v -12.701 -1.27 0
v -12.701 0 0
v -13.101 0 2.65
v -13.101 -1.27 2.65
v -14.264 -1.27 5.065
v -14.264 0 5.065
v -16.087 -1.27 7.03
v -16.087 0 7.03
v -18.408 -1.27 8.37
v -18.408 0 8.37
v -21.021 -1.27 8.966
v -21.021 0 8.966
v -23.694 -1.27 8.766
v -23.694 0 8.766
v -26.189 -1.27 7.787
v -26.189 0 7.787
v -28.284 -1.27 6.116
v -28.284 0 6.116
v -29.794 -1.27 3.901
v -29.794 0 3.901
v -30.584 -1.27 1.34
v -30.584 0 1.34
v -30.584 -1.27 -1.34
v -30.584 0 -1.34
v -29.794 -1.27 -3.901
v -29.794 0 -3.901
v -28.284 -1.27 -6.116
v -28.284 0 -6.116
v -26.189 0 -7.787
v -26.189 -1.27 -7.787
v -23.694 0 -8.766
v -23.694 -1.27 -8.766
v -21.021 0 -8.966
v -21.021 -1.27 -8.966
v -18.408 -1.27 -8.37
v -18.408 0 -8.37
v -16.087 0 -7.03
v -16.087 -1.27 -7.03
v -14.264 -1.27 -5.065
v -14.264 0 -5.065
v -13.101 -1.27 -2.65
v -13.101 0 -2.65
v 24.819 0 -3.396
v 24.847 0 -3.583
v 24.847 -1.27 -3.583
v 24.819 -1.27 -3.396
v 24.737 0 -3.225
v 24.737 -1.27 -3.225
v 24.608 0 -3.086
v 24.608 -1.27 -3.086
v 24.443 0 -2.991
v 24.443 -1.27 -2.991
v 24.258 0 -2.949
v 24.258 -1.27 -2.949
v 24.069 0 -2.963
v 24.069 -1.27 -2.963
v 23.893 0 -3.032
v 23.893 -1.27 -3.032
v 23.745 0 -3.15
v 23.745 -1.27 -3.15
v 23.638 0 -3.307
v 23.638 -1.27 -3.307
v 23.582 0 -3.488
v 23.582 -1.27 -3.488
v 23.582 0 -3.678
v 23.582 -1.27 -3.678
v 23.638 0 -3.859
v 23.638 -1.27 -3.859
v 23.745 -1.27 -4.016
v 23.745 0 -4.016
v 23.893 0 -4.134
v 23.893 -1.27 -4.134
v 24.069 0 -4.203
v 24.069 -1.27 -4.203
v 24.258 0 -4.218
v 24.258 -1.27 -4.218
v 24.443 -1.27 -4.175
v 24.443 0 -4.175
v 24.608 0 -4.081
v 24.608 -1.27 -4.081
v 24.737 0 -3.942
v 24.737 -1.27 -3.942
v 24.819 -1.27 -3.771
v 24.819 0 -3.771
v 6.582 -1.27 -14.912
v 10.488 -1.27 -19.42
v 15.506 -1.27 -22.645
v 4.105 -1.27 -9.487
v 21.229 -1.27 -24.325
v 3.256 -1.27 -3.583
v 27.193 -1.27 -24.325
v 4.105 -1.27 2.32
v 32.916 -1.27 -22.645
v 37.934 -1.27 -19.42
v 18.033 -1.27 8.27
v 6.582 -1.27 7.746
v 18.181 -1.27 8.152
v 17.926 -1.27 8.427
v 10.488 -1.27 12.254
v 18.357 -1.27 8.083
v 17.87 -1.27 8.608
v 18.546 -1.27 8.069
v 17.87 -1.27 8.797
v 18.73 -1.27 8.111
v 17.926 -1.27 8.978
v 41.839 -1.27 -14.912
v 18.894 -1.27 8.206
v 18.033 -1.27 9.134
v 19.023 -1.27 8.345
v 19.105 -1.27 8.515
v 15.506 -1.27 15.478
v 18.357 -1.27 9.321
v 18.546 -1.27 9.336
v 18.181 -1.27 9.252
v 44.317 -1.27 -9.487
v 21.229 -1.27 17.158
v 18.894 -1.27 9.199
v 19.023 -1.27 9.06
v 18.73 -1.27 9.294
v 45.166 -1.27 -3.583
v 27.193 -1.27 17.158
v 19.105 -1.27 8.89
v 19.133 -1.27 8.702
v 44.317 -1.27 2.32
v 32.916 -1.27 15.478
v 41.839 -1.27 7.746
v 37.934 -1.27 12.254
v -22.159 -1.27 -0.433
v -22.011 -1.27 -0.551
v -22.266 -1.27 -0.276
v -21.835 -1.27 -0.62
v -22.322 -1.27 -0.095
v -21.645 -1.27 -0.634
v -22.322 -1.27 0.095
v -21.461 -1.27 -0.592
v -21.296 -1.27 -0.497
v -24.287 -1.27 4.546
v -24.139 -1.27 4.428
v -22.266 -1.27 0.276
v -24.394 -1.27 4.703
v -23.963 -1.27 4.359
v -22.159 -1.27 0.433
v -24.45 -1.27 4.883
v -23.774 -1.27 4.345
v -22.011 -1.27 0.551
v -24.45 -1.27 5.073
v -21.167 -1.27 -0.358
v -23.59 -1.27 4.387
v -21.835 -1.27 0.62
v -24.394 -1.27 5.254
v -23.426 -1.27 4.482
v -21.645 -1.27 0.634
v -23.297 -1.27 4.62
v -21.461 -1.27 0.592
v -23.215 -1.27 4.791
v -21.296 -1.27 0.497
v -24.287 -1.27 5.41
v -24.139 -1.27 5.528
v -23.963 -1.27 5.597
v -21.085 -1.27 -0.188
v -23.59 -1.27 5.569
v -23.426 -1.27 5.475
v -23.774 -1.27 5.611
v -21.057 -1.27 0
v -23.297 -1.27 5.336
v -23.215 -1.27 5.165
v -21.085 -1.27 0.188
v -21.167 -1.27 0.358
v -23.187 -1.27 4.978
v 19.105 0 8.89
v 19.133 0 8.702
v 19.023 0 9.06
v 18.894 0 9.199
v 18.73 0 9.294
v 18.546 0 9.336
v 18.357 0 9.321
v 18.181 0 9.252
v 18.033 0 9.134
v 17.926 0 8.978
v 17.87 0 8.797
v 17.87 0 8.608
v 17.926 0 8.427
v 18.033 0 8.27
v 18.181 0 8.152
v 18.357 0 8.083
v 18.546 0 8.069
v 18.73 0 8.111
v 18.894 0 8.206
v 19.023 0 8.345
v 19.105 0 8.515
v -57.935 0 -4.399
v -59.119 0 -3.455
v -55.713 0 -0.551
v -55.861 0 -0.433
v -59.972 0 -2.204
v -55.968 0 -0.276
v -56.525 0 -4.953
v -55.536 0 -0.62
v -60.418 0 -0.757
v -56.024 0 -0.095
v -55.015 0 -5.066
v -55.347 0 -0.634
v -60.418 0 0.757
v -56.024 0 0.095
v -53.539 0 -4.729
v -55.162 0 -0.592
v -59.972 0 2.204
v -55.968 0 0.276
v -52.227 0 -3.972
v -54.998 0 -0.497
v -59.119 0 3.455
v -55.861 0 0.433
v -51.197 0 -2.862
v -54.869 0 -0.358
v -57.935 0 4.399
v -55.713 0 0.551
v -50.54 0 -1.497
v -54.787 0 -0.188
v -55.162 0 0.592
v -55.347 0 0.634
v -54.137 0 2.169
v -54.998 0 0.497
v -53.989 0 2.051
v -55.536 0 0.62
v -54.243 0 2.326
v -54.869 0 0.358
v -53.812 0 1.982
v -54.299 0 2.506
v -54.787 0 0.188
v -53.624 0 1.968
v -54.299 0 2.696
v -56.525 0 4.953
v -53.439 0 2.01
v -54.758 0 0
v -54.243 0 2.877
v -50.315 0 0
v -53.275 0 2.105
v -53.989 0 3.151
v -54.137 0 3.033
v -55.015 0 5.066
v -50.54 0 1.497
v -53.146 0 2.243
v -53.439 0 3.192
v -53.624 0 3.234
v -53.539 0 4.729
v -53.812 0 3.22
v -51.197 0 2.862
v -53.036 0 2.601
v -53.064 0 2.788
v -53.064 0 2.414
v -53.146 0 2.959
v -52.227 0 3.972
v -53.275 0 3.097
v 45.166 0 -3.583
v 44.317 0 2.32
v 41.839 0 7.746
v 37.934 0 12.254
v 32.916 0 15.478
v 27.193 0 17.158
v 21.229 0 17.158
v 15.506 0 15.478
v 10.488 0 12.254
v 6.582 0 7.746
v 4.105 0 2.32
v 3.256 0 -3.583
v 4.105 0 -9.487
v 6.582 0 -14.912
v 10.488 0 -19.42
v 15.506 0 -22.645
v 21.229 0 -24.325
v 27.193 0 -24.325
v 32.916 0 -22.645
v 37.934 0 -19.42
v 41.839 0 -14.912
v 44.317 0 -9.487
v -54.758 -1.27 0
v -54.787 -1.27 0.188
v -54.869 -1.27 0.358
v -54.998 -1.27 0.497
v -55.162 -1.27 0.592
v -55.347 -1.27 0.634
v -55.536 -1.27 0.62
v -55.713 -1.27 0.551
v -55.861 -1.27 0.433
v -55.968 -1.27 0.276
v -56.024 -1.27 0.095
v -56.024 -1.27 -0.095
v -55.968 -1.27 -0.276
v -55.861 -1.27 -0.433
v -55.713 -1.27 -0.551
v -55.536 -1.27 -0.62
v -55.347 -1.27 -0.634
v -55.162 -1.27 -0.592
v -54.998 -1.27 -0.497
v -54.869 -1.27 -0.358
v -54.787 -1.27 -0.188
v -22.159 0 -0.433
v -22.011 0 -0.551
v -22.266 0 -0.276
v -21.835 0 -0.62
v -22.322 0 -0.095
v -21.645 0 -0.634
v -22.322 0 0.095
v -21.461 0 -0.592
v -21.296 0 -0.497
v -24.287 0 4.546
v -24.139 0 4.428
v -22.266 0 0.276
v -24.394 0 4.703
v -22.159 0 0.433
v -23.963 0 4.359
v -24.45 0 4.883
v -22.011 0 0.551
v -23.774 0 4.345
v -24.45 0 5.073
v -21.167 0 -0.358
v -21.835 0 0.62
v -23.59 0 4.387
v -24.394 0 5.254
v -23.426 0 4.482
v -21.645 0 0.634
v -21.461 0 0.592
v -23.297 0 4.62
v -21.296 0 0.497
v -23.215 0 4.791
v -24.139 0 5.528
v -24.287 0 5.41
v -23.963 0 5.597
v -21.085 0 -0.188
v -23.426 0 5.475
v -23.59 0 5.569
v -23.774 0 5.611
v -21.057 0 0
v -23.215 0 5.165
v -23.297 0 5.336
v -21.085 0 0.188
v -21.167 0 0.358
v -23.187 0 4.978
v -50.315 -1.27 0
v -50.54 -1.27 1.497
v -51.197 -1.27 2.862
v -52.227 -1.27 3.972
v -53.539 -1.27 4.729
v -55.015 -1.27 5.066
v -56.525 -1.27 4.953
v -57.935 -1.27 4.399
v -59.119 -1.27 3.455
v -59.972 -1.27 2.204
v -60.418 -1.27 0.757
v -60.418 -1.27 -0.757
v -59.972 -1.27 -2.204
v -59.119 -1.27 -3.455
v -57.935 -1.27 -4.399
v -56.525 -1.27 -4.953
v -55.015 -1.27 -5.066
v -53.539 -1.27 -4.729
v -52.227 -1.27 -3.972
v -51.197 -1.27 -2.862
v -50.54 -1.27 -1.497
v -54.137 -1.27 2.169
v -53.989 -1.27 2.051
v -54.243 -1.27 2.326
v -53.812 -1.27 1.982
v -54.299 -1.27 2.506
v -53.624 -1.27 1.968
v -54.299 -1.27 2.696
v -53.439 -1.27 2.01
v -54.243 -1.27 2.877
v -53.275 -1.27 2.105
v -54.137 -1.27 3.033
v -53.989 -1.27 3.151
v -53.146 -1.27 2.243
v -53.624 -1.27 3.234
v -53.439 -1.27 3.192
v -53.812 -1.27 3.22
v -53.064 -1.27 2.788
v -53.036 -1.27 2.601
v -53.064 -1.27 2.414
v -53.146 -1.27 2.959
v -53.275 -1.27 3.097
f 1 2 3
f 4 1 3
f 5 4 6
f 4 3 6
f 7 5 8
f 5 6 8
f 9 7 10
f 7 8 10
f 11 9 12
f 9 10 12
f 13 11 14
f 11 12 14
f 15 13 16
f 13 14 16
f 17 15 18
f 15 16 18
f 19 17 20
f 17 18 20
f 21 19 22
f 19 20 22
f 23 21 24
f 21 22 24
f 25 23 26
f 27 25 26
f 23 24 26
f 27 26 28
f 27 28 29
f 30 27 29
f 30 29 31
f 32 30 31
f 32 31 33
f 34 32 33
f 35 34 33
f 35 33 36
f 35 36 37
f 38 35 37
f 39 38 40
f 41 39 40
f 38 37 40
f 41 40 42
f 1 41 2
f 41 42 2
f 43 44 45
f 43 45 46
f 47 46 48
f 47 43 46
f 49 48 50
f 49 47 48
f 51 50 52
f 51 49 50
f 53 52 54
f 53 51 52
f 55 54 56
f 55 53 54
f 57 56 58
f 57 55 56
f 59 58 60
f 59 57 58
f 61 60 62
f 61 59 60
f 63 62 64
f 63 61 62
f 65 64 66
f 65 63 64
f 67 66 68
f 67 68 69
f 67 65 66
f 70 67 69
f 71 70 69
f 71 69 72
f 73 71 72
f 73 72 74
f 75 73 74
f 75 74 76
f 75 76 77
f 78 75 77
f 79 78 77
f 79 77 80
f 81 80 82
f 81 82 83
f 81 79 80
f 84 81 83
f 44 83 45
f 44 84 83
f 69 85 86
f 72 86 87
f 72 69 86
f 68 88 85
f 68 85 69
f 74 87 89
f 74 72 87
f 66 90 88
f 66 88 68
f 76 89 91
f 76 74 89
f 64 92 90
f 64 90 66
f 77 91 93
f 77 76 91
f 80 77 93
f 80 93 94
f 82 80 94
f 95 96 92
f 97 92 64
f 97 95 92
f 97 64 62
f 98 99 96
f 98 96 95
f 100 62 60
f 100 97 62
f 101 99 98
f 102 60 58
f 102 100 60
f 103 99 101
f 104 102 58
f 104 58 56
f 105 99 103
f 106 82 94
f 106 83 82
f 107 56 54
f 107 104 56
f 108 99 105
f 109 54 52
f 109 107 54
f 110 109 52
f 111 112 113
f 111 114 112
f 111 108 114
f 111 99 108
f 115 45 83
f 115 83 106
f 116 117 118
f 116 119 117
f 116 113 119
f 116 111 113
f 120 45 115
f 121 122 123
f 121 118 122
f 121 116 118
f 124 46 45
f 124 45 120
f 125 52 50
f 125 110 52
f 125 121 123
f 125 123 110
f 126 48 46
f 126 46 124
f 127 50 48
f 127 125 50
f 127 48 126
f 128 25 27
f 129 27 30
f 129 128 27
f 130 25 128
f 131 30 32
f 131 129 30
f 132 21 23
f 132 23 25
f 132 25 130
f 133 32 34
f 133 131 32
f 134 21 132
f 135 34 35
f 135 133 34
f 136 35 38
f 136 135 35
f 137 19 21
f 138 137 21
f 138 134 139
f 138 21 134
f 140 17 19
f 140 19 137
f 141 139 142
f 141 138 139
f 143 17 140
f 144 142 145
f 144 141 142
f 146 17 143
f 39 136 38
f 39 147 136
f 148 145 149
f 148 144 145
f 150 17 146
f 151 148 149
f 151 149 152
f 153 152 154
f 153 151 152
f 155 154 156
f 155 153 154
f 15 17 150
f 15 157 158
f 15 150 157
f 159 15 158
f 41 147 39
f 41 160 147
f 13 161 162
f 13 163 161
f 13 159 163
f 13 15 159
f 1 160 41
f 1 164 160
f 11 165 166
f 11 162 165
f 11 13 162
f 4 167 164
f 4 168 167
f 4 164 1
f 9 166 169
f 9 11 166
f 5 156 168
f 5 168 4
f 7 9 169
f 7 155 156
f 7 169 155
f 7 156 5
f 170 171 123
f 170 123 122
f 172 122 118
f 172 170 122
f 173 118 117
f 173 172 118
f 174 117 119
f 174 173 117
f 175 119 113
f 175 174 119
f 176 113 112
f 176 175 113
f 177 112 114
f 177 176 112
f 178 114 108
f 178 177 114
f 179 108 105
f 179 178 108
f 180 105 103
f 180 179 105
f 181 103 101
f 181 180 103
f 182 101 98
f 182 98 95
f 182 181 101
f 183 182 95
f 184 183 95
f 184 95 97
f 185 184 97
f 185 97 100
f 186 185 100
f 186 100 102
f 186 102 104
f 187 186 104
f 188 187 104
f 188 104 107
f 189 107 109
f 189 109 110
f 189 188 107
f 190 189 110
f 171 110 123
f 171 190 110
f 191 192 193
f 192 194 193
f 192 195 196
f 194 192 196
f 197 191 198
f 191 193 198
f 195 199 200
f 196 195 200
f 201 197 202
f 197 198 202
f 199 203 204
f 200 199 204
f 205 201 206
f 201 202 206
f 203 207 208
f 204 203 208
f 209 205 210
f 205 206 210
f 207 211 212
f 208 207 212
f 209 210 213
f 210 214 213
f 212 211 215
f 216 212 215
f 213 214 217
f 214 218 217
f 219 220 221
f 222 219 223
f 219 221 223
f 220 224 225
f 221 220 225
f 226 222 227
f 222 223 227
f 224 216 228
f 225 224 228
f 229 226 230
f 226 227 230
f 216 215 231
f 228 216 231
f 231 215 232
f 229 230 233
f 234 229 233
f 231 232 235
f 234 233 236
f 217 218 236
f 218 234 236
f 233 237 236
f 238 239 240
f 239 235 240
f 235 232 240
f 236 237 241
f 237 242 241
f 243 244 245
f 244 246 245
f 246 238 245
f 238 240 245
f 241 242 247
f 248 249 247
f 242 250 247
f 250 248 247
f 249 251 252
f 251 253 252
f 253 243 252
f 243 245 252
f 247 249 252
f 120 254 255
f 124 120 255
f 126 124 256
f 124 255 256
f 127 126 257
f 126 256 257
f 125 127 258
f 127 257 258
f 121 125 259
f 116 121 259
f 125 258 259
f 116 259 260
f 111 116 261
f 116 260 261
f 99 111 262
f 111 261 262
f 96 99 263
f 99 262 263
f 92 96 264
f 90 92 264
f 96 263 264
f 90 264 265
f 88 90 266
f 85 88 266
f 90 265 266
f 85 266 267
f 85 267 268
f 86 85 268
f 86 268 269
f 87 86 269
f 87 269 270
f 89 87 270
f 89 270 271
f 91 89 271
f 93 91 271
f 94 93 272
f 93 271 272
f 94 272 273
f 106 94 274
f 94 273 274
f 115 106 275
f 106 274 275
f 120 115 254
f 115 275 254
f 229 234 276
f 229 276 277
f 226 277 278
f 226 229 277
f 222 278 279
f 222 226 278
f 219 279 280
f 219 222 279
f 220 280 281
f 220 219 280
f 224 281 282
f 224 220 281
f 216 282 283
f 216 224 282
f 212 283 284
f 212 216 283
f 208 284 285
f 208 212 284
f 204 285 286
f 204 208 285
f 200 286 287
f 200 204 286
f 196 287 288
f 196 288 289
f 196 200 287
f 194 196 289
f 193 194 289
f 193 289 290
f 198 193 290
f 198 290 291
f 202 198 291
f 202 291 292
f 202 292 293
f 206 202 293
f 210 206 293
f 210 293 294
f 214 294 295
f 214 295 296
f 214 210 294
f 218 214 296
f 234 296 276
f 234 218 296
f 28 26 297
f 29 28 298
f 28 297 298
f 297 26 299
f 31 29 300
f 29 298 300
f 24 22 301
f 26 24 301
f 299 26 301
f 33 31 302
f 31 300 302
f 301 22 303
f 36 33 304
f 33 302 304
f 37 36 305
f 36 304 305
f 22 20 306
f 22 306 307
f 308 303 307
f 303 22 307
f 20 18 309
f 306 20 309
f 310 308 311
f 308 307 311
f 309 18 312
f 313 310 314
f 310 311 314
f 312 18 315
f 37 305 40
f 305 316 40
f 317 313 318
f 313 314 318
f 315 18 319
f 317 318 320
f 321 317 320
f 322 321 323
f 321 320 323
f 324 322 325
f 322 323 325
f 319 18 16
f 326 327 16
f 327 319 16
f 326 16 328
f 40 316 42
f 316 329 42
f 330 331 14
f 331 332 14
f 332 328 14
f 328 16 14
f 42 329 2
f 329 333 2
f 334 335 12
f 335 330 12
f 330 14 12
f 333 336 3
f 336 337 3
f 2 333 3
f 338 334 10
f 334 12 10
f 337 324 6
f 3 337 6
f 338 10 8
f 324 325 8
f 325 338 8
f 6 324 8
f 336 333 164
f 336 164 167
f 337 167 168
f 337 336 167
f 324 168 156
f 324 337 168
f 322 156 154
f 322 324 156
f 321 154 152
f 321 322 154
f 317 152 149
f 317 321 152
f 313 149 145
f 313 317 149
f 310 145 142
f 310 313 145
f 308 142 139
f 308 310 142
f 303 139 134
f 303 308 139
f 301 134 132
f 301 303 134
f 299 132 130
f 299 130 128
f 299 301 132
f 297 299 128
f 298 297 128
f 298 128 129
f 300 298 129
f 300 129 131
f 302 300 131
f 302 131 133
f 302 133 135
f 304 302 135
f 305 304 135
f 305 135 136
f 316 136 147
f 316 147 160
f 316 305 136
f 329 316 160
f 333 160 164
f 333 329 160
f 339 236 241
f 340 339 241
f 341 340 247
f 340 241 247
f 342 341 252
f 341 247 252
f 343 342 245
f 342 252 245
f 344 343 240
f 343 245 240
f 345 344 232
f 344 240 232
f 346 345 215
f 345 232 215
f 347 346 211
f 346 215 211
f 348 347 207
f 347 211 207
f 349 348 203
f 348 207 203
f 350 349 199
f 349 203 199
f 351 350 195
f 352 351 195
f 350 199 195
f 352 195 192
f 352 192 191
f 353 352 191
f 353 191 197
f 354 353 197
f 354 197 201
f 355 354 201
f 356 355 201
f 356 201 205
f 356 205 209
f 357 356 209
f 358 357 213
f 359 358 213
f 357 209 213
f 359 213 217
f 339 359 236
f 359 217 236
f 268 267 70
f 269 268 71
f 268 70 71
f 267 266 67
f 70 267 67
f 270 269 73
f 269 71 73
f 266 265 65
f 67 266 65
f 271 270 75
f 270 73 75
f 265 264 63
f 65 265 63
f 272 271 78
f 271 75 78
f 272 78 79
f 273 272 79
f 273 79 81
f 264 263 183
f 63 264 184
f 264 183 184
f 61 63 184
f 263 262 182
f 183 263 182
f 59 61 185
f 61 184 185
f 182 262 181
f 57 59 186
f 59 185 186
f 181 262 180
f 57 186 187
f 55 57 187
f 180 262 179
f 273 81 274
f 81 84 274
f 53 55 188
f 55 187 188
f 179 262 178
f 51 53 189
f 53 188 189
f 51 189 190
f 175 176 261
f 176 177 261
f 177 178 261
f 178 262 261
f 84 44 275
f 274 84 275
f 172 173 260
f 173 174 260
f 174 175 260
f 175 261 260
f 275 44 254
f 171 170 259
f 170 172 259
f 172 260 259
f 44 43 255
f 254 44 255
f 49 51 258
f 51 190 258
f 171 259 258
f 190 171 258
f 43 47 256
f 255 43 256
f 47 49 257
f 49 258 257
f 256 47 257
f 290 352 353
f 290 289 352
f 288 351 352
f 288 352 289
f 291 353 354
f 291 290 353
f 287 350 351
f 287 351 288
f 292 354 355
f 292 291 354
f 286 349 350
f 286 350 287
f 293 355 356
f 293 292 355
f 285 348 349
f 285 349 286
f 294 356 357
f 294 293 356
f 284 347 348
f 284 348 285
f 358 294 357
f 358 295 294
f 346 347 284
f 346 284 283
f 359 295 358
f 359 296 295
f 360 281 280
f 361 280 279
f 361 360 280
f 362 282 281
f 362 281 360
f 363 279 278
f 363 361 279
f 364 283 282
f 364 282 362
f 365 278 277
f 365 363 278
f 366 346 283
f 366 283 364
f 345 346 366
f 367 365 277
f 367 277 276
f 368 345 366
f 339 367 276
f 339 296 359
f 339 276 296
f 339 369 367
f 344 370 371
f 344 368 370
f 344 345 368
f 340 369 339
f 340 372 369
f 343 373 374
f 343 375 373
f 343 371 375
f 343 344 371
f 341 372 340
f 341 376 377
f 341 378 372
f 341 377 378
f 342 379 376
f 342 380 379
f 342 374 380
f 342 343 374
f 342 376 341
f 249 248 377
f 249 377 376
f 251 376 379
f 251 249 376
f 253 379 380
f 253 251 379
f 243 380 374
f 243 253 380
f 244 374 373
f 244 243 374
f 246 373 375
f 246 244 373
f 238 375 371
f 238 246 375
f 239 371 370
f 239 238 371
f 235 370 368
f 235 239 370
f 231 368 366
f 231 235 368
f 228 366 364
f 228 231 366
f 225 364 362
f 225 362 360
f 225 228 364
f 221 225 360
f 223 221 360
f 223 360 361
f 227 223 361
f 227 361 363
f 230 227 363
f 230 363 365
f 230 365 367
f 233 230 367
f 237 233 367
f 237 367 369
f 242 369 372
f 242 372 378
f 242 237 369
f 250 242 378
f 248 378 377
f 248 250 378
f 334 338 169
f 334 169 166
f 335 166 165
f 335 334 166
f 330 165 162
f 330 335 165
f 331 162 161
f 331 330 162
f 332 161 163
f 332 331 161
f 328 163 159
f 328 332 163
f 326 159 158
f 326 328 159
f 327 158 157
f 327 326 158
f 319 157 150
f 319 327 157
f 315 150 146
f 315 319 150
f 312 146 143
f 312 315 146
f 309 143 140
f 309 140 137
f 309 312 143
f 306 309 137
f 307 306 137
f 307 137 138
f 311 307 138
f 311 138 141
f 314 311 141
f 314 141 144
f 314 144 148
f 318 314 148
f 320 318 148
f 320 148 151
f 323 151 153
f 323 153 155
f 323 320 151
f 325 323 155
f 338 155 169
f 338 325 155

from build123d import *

# Parameters (mm, degrees)
F0_R     = 5.08
F0_R_2   = 0.636219
F0_R_3   = 0.635
F1_DEPTH = 1.27
F0_R_4   = 8.9916
F0_R_5   = 20.955
F2_DEPTH = 1.27


with BuildPart() as f1:
    # F0 (on Front) → F1 (new body)
    with BuildSketch(Plane.XZ):
        with Locations((-55.394662, 0)):
            Circle(F0_R)
        with Locations((-55.394662, 0)):
            Circle(F0_R_2, mode=Mode.SUBTRACT)
        with Locations((-53.671103, 2.601031)):
            Circle(F0_R_3, mode=Mode.SUBTRACT)
    extrude(amount=F1_DEPTH)

    # F0 (on Front) → F2 (join)
    with BuildSketch(Plane.XZ):
        with Locations((-55.394662, 0)):
            Circle(F0_R)
        with Locations((-55.394662, 0)):
            Circle(F0_R_2, mode=Mode.SUBTRACT)
        with Locations((-53.671103, 2.601031)):
            Circle(F0_R_3, mode=Mode.SUBTRACT)
        with Locations((-21.693016, 0)):
            Circle(F0_R_4)
        with Locations((-21.693016, 0)):
            Circle(F0_R_2, mode=Mode.SUBTRACT)
        with Locations((-23.821851, 4.97806)):
            Circle(F0_R_3, mode=Mode.SUBTRACT)
        with Locations((24.210954, -3.583221)):
            Circle(F0_R_5)
        with Locations((24.210954, -3.583221)):
            Circle(F0_R_2, mode=Mode.SUBTRACT)
        with Locations((18.498367, 8.702404)):
            Circle(F0_R_3, mode=Mode.SUBTRACT)
    extrude(amount=F2_DEPTH)


solid = f1.part
